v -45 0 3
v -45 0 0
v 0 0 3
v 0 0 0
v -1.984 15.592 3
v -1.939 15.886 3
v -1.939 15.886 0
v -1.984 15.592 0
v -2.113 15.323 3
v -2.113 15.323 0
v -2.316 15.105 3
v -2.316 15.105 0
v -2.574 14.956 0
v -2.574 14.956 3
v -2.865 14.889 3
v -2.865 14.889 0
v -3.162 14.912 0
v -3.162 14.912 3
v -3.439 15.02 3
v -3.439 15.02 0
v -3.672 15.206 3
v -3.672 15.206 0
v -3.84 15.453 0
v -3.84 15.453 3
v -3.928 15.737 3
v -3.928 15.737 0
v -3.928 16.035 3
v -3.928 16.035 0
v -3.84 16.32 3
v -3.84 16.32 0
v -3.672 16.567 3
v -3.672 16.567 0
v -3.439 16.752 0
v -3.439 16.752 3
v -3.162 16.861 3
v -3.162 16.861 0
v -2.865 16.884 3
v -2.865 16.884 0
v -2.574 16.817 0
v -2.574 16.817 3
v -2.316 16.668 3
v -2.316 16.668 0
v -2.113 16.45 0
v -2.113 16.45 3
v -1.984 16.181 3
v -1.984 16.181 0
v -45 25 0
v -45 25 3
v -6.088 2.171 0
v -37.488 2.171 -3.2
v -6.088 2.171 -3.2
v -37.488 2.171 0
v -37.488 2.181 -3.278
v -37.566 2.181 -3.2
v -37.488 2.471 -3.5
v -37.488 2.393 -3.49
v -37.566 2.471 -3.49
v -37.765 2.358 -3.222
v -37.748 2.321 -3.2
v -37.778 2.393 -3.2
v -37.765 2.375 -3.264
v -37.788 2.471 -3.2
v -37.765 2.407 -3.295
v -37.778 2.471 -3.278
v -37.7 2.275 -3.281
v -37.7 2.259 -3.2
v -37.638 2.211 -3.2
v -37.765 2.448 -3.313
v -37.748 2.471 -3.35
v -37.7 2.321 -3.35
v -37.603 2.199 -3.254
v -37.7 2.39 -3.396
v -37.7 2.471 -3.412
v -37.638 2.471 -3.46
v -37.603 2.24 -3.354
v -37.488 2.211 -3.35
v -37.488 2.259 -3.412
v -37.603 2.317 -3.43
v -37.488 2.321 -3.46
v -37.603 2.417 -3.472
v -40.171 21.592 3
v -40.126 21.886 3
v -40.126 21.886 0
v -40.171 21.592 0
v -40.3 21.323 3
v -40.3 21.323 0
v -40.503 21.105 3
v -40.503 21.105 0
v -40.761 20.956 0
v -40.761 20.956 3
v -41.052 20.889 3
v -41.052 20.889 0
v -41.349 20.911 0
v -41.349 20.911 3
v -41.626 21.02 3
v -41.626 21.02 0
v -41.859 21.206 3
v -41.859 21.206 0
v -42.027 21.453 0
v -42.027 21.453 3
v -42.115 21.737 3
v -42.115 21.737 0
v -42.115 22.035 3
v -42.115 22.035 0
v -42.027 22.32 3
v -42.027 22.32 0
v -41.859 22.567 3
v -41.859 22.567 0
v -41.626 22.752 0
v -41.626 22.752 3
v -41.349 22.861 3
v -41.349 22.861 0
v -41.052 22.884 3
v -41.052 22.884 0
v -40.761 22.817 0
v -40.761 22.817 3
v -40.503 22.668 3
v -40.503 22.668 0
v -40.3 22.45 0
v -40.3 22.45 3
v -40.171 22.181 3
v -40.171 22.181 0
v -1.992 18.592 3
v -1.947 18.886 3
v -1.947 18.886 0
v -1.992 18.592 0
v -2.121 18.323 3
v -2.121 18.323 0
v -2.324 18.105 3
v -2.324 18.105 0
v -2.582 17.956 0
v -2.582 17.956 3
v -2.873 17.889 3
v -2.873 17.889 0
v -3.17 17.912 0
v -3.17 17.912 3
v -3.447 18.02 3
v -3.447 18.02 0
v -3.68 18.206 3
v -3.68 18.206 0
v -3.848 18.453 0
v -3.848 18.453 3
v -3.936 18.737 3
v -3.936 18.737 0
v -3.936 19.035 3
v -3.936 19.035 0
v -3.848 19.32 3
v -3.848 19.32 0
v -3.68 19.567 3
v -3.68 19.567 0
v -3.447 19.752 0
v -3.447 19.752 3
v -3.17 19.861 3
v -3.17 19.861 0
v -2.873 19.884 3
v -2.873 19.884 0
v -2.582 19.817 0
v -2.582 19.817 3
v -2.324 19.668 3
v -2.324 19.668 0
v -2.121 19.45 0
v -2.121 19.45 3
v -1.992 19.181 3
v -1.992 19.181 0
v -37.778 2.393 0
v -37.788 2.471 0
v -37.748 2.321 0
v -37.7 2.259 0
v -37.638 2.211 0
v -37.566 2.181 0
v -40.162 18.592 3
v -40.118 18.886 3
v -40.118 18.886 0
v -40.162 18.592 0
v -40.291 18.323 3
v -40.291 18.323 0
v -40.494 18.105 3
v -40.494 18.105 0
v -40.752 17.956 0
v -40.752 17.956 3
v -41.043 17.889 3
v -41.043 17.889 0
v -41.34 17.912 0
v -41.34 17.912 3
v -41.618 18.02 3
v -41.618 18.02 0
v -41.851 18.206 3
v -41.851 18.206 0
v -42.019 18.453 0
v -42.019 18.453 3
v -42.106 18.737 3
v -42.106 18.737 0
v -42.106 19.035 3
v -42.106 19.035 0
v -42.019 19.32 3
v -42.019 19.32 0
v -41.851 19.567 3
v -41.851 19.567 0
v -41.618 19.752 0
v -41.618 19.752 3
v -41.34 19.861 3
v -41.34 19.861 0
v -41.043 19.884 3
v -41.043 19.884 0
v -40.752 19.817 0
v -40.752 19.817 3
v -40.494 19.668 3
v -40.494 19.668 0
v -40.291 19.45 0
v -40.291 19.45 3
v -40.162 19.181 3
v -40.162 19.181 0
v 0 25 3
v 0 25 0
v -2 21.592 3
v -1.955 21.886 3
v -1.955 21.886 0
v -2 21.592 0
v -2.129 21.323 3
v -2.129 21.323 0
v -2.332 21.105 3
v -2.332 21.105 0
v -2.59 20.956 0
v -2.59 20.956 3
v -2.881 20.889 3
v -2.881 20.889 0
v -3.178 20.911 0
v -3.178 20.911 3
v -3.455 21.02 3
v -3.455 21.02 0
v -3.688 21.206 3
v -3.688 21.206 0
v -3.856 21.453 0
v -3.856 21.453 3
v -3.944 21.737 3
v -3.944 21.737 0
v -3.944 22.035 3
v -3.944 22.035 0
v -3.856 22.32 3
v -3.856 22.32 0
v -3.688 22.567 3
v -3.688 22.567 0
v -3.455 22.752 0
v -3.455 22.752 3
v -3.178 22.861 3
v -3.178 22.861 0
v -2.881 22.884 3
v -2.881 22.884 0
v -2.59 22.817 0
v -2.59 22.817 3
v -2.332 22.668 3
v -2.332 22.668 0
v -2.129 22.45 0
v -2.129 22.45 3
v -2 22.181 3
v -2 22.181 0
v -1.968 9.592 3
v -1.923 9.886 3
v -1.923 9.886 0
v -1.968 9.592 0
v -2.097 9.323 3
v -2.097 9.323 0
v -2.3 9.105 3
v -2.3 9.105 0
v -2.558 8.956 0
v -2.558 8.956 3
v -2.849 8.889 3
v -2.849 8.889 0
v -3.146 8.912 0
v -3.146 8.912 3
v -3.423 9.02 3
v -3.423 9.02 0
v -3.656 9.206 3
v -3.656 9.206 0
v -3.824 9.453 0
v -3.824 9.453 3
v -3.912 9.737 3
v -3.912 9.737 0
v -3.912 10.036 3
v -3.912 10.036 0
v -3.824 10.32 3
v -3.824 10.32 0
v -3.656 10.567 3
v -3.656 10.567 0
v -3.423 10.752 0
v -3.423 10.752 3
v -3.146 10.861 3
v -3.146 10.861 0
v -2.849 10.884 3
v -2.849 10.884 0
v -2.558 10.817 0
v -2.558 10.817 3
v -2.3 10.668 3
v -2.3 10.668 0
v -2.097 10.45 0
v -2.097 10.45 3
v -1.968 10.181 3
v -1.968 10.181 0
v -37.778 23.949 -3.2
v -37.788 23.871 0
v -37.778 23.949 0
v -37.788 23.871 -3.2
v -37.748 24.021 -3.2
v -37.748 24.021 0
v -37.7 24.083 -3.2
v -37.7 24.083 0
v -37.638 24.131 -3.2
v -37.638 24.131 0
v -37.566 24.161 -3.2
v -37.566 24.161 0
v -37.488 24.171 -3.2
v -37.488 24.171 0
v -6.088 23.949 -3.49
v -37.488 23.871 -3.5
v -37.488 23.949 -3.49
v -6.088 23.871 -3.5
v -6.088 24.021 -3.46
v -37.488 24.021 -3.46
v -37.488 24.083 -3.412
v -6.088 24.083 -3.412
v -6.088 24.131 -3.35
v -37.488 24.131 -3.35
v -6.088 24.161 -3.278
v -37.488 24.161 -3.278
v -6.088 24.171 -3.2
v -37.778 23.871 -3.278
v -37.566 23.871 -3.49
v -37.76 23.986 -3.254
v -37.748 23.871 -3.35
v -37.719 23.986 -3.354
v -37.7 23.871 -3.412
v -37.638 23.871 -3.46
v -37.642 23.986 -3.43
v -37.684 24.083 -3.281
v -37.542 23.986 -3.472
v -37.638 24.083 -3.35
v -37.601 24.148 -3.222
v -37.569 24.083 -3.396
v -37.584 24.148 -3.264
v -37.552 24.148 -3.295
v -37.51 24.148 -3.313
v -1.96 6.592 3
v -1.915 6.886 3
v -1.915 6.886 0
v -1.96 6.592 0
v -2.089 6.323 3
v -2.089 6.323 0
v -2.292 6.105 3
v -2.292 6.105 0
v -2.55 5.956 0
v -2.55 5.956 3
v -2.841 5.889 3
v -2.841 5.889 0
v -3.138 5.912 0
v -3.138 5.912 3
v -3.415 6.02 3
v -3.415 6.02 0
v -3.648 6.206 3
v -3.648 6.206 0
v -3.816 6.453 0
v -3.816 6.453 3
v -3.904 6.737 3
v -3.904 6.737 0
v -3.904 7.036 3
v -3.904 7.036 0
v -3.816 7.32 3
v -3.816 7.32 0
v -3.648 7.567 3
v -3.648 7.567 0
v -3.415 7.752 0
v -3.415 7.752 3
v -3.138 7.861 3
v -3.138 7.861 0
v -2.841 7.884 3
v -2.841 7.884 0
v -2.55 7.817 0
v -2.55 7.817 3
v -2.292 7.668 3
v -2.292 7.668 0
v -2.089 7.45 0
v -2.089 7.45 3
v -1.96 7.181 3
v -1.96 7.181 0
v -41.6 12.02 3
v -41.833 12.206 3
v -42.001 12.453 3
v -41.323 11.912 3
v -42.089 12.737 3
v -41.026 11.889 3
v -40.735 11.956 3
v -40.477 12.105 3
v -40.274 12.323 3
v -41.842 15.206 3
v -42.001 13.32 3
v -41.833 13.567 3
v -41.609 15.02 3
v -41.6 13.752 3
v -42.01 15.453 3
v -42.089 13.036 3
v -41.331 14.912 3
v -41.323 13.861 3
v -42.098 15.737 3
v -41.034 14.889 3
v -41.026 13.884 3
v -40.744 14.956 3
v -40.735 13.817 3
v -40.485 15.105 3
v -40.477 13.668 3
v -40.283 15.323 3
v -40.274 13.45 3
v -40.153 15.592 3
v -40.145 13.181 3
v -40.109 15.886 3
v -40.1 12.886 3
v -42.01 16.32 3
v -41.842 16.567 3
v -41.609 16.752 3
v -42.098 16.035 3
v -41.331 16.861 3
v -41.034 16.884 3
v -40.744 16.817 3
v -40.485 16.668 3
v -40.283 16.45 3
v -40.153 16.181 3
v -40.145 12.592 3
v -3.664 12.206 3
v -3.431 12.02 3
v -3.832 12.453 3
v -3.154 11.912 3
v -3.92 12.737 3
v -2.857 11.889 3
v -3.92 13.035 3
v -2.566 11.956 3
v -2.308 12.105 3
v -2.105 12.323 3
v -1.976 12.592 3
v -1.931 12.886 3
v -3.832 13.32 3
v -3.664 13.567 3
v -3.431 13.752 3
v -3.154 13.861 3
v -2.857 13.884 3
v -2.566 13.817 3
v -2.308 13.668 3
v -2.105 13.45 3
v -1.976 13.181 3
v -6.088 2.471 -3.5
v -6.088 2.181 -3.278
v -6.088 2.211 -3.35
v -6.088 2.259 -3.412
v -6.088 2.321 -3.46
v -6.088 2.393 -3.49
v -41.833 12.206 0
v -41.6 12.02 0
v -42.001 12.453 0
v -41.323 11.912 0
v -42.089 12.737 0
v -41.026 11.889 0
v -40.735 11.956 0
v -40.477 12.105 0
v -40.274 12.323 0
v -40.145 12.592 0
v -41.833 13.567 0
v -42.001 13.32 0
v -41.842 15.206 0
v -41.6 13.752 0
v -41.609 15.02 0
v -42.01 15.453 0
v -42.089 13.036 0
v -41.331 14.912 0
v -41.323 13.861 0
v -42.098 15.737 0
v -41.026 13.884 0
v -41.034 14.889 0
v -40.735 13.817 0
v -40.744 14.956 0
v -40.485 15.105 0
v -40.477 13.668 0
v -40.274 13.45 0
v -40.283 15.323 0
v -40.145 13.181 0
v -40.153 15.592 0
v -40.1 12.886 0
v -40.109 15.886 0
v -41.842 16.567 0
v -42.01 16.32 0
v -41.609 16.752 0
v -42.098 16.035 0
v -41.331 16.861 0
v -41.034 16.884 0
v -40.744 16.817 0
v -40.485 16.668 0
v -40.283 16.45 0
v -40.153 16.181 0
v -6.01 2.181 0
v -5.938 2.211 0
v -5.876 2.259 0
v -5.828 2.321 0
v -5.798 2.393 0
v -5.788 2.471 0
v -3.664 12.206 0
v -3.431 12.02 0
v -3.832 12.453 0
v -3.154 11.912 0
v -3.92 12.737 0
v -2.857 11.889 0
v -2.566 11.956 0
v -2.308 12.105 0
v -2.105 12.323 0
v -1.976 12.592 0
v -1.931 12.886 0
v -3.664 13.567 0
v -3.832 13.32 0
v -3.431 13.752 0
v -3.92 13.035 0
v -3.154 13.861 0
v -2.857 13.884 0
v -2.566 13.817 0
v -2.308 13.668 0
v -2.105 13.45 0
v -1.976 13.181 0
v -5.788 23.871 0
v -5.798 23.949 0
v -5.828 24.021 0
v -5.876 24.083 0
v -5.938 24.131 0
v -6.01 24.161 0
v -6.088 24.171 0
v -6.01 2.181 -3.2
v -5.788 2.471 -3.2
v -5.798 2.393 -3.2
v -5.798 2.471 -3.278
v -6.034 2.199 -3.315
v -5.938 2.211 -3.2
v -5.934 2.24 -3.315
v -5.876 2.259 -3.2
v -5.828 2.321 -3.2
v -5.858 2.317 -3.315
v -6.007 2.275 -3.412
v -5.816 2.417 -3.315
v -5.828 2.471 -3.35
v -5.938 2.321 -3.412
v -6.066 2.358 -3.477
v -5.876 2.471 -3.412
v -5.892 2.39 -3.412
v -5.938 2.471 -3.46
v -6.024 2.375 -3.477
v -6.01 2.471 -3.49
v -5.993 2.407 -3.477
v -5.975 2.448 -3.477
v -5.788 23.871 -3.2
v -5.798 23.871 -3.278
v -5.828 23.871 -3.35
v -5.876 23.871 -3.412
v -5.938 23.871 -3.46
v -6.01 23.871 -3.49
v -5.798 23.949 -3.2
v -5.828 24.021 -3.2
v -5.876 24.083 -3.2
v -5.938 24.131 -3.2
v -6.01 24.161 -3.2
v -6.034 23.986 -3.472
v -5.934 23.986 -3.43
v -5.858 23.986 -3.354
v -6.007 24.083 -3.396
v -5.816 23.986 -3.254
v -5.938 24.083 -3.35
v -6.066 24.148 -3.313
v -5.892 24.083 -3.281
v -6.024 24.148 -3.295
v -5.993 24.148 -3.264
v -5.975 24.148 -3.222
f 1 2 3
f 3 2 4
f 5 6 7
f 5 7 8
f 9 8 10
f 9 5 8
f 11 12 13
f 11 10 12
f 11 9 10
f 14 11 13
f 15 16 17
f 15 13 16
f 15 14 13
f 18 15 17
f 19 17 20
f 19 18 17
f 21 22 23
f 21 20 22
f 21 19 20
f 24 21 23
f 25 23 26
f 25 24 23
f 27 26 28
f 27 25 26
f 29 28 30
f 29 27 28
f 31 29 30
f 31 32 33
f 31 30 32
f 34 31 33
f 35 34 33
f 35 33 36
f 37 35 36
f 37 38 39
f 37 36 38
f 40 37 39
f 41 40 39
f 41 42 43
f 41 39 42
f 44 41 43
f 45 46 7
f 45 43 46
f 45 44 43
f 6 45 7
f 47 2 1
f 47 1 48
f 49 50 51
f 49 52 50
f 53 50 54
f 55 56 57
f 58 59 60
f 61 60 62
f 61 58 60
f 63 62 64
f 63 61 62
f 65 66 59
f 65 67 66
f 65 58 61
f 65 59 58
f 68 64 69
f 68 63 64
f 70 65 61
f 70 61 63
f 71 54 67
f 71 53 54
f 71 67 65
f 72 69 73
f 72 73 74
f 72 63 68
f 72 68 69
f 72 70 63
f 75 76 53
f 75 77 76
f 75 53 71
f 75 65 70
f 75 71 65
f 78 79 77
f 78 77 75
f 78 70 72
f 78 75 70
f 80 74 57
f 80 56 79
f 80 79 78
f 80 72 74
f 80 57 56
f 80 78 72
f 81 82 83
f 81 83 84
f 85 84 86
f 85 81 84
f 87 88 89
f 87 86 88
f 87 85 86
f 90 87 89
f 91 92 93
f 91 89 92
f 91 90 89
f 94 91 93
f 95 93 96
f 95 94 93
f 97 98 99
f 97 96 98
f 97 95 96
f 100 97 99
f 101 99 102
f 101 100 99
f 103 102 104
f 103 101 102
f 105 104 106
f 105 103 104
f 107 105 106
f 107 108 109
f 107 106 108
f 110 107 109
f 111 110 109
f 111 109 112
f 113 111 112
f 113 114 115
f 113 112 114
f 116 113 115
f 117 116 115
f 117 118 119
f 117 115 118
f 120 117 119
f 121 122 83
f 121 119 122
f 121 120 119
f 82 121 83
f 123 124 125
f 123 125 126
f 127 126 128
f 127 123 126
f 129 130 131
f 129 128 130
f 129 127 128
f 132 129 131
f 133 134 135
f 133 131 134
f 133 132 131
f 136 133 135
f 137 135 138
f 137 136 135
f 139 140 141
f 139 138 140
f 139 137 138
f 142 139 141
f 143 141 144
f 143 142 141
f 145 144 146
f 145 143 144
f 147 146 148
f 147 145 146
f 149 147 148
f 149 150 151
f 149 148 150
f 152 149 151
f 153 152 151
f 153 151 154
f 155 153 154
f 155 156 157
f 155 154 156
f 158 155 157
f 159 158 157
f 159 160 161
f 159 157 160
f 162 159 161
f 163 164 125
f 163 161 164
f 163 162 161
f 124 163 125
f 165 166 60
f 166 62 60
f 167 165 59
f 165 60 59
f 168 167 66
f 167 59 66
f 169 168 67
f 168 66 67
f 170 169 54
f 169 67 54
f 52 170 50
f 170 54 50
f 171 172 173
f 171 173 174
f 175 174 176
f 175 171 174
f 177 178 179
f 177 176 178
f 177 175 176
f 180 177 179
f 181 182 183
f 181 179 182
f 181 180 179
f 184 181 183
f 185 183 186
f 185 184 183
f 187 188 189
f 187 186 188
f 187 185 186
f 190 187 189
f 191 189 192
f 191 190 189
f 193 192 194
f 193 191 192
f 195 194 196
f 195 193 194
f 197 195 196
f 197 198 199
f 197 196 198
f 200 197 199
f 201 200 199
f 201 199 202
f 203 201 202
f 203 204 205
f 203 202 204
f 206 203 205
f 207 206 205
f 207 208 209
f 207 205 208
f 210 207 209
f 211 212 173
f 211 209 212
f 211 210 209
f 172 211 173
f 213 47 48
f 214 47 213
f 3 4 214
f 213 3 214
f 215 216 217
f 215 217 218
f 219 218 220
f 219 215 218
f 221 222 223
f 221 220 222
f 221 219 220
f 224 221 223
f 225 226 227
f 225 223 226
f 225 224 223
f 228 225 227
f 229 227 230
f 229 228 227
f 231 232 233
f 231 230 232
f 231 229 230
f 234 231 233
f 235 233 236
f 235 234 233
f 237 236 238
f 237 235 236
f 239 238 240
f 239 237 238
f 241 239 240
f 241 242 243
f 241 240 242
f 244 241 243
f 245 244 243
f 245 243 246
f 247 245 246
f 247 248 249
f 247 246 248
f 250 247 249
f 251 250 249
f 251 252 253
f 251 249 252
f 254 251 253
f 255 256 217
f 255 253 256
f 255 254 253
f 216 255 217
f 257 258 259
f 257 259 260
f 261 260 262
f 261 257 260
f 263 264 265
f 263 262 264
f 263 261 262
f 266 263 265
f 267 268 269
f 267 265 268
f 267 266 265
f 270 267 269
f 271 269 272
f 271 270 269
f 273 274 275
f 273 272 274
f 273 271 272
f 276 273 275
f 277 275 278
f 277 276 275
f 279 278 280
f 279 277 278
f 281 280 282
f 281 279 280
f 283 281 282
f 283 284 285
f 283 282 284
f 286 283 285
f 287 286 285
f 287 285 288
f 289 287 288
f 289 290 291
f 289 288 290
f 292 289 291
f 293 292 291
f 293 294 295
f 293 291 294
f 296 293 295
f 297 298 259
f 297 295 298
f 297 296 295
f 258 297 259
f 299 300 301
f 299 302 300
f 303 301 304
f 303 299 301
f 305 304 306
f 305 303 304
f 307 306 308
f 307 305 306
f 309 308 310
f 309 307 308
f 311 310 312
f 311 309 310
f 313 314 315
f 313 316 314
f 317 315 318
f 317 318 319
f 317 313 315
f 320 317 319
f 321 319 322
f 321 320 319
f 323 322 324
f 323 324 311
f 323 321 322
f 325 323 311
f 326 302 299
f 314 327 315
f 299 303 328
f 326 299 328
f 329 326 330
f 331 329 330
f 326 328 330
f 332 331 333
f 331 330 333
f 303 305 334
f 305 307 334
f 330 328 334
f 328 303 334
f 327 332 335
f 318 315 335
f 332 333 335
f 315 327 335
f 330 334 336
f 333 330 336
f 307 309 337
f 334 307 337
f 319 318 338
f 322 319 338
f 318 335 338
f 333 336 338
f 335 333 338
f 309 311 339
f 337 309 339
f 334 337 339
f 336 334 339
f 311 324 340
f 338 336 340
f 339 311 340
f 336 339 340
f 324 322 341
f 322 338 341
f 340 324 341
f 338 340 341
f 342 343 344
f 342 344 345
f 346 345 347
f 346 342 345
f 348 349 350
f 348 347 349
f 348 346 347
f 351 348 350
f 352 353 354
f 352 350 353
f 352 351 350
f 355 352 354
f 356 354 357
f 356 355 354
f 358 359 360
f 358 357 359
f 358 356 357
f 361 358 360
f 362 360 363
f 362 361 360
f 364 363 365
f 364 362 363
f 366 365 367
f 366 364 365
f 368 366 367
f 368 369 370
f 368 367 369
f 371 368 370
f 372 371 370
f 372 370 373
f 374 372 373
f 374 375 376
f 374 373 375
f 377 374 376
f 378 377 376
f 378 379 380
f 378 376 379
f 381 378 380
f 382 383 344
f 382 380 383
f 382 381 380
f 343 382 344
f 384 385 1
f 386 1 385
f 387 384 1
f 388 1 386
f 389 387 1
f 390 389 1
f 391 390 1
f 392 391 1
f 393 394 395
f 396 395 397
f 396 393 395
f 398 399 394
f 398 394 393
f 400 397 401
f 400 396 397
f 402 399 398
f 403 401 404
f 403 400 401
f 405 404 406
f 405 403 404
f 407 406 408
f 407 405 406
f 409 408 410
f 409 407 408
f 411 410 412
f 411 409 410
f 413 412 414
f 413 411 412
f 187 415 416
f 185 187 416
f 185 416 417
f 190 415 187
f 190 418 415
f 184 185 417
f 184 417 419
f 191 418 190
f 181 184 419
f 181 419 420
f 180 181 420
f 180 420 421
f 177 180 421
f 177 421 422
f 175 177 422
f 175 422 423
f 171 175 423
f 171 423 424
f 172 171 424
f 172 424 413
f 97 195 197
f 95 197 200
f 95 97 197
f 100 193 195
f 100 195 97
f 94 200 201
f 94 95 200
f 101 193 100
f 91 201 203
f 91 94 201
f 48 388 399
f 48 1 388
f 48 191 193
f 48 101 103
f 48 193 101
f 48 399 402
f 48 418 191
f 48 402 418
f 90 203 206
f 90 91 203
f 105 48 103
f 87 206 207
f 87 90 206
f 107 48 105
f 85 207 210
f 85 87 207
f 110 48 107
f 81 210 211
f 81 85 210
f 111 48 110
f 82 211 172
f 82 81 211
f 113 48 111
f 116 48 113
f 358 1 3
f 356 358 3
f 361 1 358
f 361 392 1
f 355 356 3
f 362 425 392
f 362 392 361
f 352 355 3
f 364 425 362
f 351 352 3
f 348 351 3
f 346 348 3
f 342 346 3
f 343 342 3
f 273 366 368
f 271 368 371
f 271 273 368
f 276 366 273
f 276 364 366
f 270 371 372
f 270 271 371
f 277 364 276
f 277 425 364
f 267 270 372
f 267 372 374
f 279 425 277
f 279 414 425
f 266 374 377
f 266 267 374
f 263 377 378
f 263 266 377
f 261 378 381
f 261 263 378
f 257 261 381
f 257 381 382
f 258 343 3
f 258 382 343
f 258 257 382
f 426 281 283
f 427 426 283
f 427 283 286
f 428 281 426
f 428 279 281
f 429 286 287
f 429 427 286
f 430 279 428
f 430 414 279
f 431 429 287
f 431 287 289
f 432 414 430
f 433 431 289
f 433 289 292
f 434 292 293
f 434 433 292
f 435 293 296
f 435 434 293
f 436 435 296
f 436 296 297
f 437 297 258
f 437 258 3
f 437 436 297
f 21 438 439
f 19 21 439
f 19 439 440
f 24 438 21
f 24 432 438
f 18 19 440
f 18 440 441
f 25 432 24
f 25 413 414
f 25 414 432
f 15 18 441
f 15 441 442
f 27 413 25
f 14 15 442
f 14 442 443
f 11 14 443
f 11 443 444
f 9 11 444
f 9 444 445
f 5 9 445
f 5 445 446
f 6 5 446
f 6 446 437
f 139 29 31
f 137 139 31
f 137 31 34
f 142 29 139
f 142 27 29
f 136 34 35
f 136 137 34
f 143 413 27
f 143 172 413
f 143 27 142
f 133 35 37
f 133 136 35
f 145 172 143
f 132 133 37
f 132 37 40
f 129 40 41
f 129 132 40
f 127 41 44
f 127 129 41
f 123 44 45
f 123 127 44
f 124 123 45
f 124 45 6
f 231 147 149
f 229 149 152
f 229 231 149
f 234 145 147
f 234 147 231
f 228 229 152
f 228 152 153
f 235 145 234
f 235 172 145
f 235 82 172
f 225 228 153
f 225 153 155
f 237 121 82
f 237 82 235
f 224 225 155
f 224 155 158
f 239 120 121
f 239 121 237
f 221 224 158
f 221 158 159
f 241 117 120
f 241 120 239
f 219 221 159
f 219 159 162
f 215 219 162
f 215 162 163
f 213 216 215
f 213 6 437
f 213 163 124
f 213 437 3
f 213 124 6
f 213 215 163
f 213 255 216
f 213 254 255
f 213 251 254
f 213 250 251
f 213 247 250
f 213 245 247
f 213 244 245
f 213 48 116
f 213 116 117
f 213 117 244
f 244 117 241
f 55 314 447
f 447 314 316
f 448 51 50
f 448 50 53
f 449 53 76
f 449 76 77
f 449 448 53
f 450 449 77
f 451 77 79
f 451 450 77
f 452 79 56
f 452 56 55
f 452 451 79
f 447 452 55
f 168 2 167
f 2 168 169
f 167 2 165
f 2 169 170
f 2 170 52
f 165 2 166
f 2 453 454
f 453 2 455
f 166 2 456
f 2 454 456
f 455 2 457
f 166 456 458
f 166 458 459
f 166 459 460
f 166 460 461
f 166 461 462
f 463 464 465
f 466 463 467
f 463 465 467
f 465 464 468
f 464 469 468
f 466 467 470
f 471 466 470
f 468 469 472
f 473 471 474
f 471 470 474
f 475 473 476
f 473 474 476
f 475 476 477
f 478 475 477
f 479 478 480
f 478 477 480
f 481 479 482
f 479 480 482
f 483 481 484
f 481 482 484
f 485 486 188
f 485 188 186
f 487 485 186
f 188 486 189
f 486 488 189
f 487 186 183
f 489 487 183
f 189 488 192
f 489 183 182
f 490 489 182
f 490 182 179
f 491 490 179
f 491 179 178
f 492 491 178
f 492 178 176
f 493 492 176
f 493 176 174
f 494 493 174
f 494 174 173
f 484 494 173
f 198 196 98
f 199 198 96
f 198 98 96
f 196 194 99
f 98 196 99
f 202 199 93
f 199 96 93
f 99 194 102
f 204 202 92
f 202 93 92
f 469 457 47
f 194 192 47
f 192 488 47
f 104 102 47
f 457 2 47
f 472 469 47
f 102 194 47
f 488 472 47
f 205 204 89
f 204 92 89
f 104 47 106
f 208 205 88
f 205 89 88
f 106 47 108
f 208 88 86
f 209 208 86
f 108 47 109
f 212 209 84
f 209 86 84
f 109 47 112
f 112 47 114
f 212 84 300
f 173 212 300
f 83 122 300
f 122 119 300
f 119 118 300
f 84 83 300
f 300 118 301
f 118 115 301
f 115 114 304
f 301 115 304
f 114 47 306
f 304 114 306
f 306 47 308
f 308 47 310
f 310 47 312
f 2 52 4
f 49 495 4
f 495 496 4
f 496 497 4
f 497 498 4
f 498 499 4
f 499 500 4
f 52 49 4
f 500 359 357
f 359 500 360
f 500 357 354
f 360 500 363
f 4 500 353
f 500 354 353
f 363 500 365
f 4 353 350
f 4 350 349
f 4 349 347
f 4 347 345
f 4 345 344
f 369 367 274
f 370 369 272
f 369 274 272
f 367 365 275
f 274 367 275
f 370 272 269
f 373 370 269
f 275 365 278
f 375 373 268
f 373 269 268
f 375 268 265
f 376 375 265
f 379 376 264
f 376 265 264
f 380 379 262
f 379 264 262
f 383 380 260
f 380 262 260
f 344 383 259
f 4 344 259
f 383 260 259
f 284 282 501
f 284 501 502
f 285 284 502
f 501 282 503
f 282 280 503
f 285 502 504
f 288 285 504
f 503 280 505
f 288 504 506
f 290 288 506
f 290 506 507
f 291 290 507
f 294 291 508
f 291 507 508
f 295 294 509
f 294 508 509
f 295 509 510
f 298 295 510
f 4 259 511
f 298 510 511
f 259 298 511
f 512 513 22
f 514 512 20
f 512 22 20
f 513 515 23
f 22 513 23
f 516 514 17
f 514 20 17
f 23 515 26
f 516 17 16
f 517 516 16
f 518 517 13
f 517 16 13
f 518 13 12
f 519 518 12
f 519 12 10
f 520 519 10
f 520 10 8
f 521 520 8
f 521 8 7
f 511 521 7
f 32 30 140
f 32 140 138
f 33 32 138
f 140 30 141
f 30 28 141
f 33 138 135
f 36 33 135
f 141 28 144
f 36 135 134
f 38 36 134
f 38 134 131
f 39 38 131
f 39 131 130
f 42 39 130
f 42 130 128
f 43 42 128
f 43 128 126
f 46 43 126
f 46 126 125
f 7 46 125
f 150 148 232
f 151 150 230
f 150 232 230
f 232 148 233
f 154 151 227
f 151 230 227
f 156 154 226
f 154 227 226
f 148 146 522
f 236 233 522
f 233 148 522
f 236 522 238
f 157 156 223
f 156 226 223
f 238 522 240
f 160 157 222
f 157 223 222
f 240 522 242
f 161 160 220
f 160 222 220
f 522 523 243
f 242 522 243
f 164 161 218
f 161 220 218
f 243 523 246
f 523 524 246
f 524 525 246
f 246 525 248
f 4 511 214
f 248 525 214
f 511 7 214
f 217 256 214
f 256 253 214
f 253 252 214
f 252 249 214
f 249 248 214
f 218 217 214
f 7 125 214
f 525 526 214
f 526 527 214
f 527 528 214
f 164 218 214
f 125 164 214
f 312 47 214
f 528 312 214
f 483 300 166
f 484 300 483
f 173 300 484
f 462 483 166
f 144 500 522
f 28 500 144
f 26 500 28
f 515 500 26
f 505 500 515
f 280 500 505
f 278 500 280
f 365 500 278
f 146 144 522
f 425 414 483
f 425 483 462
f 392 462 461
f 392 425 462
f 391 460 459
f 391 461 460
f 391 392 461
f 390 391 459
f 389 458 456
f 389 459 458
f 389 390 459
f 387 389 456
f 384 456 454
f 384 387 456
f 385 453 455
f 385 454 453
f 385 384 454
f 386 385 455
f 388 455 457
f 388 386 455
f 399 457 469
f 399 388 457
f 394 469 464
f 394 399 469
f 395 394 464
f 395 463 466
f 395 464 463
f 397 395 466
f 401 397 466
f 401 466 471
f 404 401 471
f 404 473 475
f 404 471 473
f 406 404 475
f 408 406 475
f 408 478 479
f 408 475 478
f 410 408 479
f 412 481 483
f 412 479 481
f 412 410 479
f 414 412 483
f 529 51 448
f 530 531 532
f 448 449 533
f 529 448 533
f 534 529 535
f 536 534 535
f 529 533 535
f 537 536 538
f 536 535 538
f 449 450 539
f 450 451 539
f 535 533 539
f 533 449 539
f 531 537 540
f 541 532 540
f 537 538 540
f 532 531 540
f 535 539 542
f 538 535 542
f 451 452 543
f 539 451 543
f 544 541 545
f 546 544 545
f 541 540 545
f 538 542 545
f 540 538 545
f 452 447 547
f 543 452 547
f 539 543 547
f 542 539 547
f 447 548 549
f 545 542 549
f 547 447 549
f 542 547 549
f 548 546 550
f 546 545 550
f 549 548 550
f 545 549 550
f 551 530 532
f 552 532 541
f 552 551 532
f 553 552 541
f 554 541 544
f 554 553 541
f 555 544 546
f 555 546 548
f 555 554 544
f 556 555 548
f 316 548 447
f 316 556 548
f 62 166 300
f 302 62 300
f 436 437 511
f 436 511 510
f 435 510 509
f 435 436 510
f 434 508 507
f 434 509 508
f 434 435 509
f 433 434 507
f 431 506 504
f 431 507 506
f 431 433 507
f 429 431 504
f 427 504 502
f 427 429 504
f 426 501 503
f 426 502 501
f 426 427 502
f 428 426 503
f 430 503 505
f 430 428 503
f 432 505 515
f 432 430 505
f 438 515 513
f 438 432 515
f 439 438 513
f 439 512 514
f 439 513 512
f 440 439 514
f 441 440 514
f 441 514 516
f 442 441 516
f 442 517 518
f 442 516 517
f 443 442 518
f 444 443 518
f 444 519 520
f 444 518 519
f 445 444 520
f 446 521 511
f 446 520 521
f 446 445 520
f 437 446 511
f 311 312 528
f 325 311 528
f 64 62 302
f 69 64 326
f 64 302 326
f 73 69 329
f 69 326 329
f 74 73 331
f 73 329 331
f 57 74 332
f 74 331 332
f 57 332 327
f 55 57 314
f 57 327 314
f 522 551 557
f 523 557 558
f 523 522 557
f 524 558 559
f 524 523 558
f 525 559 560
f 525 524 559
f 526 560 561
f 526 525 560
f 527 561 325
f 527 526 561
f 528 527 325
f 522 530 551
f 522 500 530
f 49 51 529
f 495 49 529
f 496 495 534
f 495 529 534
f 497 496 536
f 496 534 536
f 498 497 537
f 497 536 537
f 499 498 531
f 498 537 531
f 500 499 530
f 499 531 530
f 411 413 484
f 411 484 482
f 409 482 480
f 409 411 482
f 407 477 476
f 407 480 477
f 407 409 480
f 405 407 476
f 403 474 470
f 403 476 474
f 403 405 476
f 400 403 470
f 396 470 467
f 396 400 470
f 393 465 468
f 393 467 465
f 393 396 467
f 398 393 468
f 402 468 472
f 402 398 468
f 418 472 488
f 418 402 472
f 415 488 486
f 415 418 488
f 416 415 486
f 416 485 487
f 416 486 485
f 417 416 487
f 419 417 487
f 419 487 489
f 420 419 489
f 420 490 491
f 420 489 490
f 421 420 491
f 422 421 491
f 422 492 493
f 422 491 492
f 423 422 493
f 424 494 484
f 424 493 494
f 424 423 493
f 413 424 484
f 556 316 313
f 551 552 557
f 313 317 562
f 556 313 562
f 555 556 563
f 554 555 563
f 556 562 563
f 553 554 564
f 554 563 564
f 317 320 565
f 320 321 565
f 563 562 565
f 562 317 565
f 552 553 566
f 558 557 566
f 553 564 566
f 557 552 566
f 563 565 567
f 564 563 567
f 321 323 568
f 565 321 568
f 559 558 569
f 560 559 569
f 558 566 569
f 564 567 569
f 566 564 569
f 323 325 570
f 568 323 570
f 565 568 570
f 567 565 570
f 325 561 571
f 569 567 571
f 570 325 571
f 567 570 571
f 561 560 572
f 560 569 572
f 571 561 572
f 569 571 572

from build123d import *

# Parameters (mm, degrees)
SKETCH1_W               = 45
SKETCH1_H               = 25
BOSS_EXTRUDE1_DEPTH     = 3
SKETCH2_W               = 32
SKETCH2_H               = 22
BOSS_EXTRUDE2_DEPTH     = 3.5
FILLET2_R               = 0.3
FILLET3_R               = 0.3
FILLET4_R               = 0.3
FILLET5_R               = 0.3
CUT_EXTRUDE4_DEPTH      = 52.596996037
CUT_EXTRUDE4_DEPTH_BACK = 7.5
SKETCH3_R               = 1


with BuildPart() as part:
    # Sketch1 → Boss-Extrude1 (new body)
    with BuildSketch(Plane.XY):
        with Locations((-22.5, 12.5)):
            Rectangle(SKETCH1_W, SKETCH1_H)
    extrude(amount=BOSS_EXTRUDE1_DEPTH)

    # Sketch2 → Boss-Extrude2 (add)
    with BuildSketch(Plane.XY):
        with Locations((-21.788087931, 13.170864642)):
            Rectangle(SKETCH2_W, SKETCH2_H)
    extrude(amount=-BOSS_EXTRUDE2_DEPTH)

    # Fillet2
    fillet2_edges = [part.edges().sort_by_distance(p)[0] for p in [
        (-5.788087931, 2.170864642, -1.75),
    ]]
    fillet(fillet2_edges, radius=FILLET2_R)

    # Fillet3
    fillet3_edges = [part.edges().sort_by_distance(p)[0] for p in [
        (-5.788087931, 13.320864642, -3.5),
        (-21.938087931, 2.170864642, -3.5),
        (-5.875955896, 2.258732607, -3.5),
    ]]
    fillet(fillet3_edges, radius=FILLET3_R)

    # Fillet4
    fillet4_edges = [part.edges().sort_by_distance(p)[0] for p in [
        (-37.788087931, 13.320864642, -3.5),
        (-37.788087931, 2.170864642, -1.6),
        (-37.788087931, 2.258732607, -3.412132034),
    ]]
    fillet(fillet4_edges, radius=FILLET4_R)

    # Fillet5
    fillet5_edges = [part.edges().sort_by_distance(p)[0] for p in [
        (-21.788087931, 24.170864642, -3.5),
        (-5.788087931, 24.170864642, -1.6),
        (-5.875955896, 24.170864642, -3.412132034),
        (-37.788087931, 24.170864642, -1.6),
        (-37.700219965, 24.170864642, -3.412132034),
    ]]
    fillet(fillet5_edges, radius=FILLET5_R)

    # Sketch3 → Cut-Extrude4 (cut, two sides: drawn at the far end of the back side and taken through both)
    with BuildSketch(Plane(origin=(0, 0, 0), x_dir=(-1, 0, 0), z_dir=(0, 0, -1)).offset(-CUT_EXTRUDE4_DEPTH_BACK)):
        with Locations(Location((41.126309662, 21.886420327, 0), (0, 0, 180))):
            Circle(SKETCH3_R)
        with Locations(Location((2.955391169, 21.886420327, 0), (0, 0, 180))):
            Circle(SKETCH3_R)
        with Locations(Location((41.117621493, 18.886432907, 0), (0, 0, 180))):
            Circle(SKETCH3_R)
        with Locations(Location((41.108933323, 15.886445488, 0), (0, 0, 180))):
            Circle(SKETCH3_R)
        with Locations(Location((41.100245154, 12.886458069, 0), (0, 0, 180))):
            Circle(SKETCH3_R)
        with Locations(Location((2.947370185, 18.886431049, 0), (0, 0, 180))):
            Circle(SKETCH3_R)
        with Locations(Location((2.939349201, 15.886441772, 0), (0, 0, 180))):
            Circle(SKETCH3_R)
        with Locations(Location((2.931328218, 12.886452495, 0), (0, 0, 180))):
            Circle(SKETCH3_R)
        with Locations(Location((2.923307234, 9.886463217, 0), (0, 0, 180))):
            Circle(SKETCH3_R)
        with Locations(Location((2.91528625, 6.88647394, 0), (0, 0, 180))):
            Circle(SKETCH3_R)
    extrude(amount=CUT_EXTRUDE4_DEPTH + CUT_EXTRUDE4_DEPTH_BACK, mode=Mode.SUBTRACT)


solid = part.part
